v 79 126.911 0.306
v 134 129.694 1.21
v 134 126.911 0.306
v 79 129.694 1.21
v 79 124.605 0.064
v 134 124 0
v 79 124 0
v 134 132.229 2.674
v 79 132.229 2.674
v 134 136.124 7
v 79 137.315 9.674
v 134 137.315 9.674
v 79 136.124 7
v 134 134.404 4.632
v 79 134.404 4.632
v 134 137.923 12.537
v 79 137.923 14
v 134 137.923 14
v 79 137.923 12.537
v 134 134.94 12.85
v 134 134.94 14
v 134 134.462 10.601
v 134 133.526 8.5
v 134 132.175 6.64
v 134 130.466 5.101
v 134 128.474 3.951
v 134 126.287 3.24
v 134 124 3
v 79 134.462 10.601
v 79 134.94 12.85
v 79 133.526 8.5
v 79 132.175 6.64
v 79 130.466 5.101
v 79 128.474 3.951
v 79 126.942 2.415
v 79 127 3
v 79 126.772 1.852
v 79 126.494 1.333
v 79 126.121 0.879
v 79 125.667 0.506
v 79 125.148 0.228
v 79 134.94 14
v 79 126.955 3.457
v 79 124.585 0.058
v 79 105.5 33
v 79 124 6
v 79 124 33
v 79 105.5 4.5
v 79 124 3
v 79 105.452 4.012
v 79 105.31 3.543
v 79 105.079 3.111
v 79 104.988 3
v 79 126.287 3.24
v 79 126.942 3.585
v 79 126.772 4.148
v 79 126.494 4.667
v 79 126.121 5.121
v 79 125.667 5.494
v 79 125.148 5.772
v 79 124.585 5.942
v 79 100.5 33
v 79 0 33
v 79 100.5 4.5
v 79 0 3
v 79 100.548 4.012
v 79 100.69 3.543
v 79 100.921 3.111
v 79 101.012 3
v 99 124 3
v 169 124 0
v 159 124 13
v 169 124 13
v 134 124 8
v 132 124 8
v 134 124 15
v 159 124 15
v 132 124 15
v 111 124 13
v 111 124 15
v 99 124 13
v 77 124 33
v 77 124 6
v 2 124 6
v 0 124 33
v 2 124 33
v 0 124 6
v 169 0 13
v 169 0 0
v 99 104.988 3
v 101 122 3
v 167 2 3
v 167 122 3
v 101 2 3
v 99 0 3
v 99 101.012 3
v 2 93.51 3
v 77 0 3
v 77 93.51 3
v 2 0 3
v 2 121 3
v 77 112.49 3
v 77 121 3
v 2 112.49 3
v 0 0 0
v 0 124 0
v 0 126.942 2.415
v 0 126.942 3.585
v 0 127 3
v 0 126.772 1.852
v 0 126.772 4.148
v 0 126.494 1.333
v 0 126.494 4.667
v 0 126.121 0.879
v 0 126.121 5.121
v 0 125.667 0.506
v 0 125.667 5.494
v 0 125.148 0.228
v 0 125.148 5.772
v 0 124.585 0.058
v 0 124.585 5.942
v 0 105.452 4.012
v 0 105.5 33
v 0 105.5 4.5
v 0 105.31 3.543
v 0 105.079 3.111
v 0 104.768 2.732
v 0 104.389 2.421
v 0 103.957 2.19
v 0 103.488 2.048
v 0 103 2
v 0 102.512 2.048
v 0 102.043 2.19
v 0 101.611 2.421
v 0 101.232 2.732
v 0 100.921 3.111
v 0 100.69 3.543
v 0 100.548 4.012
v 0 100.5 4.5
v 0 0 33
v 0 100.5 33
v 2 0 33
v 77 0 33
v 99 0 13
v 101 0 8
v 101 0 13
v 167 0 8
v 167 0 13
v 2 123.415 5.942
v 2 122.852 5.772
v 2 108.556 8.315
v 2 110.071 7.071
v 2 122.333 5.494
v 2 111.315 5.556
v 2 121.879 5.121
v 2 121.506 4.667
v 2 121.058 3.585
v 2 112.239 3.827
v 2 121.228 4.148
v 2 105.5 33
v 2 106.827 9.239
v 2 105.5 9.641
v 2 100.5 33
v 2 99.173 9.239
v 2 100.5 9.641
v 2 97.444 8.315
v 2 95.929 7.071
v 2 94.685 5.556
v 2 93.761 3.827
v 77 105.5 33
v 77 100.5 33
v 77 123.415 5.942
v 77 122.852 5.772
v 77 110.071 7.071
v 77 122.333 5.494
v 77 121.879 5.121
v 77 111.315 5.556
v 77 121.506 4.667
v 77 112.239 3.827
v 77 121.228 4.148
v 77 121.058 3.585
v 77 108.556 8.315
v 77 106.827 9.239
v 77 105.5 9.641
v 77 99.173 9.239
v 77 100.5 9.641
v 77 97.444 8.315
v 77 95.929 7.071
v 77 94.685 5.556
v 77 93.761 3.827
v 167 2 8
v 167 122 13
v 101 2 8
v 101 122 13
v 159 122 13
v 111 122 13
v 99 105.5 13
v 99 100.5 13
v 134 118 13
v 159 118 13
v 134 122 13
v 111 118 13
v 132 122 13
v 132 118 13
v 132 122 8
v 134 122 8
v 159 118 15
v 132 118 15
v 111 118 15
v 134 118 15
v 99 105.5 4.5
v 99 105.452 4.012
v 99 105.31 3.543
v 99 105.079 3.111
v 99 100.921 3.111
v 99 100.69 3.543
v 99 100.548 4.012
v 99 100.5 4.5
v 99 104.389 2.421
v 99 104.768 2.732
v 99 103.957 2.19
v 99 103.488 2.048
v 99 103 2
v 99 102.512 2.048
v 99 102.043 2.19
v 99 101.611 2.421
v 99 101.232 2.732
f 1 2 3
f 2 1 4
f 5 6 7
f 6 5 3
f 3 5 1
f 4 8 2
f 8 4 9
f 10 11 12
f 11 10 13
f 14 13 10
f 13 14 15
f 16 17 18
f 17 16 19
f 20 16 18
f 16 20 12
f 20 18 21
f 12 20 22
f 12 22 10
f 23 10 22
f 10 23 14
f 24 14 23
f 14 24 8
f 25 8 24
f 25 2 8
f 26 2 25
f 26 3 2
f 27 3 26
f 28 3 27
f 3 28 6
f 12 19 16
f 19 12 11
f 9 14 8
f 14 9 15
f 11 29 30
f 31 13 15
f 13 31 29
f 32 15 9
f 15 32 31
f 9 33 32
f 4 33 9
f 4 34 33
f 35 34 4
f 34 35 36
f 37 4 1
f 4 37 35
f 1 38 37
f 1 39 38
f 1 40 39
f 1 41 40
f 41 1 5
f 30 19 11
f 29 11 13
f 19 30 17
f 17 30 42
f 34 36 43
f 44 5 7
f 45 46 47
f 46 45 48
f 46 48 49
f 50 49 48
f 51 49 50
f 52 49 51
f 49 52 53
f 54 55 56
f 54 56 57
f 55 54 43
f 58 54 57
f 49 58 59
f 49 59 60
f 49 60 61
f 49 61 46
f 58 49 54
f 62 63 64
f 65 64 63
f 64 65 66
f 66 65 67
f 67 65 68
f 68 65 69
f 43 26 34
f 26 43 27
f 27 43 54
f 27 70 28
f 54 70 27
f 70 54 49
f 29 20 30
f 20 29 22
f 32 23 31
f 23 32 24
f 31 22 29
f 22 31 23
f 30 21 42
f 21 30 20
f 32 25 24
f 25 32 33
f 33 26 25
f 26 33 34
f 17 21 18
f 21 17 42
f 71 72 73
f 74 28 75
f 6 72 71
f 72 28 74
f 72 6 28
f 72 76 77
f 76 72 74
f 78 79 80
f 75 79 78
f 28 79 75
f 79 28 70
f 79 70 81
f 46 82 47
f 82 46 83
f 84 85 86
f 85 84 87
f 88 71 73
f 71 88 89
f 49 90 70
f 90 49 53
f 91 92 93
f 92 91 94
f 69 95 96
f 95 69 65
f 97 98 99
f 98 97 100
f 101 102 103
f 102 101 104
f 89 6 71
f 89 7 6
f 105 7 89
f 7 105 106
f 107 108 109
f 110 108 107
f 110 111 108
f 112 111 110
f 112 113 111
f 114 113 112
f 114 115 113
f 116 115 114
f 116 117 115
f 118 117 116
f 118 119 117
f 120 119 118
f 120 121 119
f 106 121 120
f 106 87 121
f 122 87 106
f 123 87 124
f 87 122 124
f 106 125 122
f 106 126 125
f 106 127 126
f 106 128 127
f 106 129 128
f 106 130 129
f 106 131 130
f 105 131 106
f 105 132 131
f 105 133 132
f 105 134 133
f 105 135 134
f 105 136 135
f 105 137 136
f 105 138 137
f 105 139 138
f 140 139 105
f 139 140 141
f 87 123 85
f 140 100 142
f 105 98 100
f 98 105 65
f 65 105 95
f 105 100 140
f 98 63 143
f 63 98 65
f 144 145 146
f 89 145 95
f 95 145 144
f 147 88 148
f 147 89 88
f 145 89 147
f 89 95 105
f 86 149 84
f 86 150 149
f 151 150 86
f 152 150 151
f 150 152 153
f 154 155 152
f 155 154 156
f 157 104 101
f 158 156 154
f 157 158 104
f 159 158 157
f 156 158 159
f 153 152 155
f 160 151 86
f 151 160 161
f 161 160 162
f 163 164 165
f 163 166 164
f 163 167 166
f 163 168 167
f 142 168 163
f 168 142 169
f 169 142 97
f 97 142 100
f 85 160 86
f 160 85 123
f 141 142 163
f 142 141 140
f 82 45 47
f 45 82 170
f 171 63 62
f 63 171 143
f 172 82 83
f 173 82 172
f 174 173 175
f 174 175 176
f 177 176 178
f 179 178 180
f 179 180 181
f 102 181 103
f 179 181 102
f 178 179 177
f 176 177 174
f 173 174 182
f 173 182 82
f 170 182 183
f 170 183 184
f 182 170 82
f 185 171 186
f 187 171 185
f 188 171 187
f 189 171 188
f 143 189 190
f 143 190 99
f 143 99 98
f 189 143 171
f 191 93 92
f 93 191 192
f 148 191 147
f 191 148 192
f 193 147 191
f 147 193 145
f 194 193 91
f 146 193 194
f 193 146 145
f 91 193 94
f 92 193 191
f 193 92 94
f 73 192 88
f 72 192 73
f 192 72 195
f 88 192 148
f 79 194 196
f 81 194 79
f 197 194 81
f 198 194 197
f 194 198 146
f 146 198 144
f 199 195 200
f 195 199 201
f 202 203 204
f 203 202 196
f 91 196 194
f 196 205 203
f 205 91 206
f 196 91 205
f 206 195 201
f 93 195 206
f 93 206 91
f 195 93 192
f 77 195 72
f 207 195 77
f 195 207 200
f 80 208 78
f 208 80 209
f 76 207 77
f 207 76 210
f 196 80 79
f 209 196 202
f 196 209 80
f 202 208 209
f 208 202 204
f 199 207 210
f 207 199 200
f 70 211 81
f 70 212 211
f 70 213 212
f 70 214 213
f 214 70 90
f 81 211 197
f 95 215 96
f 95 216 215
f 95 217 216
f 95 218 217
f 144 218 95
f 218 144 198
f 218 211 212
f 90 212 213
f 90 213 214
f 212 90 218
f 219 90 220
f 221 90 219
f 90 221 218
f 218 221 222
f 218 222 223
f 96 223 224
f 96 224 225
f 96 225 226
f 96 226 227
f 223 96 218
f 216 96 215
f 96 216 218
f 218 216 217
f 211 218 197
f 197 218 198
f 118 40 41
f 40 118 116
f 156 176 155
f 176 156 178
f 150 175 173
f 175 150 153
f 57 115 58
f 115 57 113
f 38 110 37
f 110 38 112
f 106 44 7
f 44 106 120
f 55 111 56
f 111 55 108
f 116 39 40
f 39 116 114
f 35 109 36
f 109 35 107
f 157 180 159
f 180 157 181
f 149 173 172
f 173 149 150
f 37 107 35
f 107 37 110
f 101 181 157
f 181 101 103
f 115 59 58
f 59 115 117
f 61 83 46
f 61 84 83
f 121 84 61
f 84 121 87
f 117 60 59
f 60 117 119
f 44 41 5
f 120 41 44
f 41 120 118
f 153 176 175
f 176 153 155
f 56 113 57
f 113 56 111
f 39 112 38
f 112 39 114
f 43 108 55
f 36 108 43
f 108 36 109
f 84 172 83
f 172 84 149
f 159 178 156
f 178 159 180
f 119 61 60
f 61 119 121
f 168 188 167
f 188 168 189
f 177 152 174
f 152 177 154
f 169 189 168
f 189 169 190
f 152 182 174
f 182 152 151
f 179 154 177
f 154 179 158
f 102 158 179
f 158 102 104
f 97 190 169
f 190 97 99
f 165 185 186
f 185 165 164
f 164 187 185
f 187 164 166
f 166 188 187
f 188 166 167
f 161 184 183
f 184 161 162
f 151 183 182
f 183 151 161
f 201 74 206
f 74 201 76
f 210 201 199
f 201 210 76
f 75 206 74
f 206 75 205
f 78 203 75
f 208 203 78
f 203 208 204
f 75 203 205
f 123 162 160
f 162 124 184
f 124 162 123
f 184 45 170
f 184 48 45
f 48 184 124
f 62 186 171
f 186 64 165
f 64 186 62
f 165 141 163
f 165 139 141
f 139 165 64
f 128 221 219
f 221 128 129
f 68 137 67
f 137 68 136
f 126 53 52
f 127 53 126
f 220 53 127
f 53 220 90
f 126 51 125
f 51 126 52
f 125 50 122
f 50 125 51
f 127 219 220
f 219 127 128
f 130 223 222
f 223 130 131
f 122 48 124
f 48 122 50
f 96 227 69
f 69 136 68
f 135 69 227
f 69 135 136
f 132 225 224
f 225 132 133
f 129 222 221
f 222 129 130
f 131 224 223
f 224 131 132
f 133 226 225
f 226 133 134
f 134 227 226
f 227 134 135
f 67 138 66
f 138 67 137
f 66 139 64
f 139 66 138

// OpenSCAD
// Grundeinstellungen
wall = 2;                 // Wanddicke
base_thickness = 3;        // Stärke der Bodenplatte

// Tischfuß
tisch_breite = 70+5;         // Tischfuß-Breite
tisch_len = 120;           // geschätzt
tisch_high = 30;           // Wandhöhe für Führung

// Pedal
pedal_x_breite = 64+2;
pedal_y_len = 101+2;
pedal_high_front = 5;      // Wandhöhe vorne
pedal_high_back = 10;      // Wandhöhe hinten

pedal_roof_len = 4;          // 5.5mm Luft
pedal_roof_sidedistance = 10;

// USB
usb_breite = wall;
usb__high = 8;

d_cable_left = 5;

// Positionierung
abstand_zwischen = 20;
gesamt_x_breite = wall + tisch_breite + wall + abstand_zwischen + wall + pedal_x_breite + wall;
gesamt_y_laenge = max(tisch_len, pedal_y_len) + wall * 2;

module halterung() {
    difference() {
        union() {
            // Grundplatte
            cube([gesamt_x_breite, gesamt_y_laenge, base_thickness]);

            // Tischfuß linke Wand
            translate([0, 0, base_thickness])
                cube([wall, gesamt_y_laenge, tisch_high]);

            // Tischfuß rechte Wand
            translate([wall + tisch_breite, 0, base_thickness])
                cube([wall, gesamt_y_laenge, tisch_high]);

            ////// Koordinatenursprung für Pedalbereich ///////
            x_pedal = wall + tisch_breite + wall + abstand_zwischen + wall;

            // Pedal Vorne (unten bei Y)
            translate([x_pedal, 0, base_thickness])
                cube([pedal_x_breite, wall, pedal_high_front]);

            // Pedal Hinten (oben bei Y)
            translate([x_pedal, gesamt_y_laenge - wall, base_thickness])
                cube([pedal_x_breite, wall, pedal_high_back]);

            // Pedal roof/Halter hinten
            translate([x_pedal+pedal_roof_sidedistance, gesamt_y_laenge - wall - pedal_roof_len, base_thickness+pedal_high_back])
                cube([pedal_x_breite-pedal_roof_sidedistance*2 + wall, pedal_roof_len+wall, wall]);


            // Pedal links -x
            translate([x_pedal - wall, 0, base_thickness])
                cube([wall, gesamt_y_laenge, pedal_high_back]);

            // Pedal rechts +x
            translate([x_pedal + pedal_x_breite, 0, base_thickness])
                cube([wall, gesamt_y_laenge, pedal_high_back]);
                
            // Kabeldurchfuehrung rechts
            translate([wall + tisch_breite + wall, gesamt_y_laenge, 14])
                rotate([0,90,0])
                intersection(){
                    difference(){
                        cylinder(h=abstand_zwischen+wall+pedal_x_breite/2, r=14);
                        cylinder(h=abstand_zwischen+wall+pedal_x_breite/2, r=11);
                    }
                    cube([999,999,999]);
                    }
            // bumber hinten
        translate([0, gesamt_y_laenge, base_thickness])
                rotate([0,90,0])
                cylinder(h=wall+tisch_breite+wall, r=base_thickness, $fn=32);
//            }


            // Schutz für Kabeldurchführung
        translate([0, pedal_y_len, base_thickness*0])
                rotate([0,90,0])
                cylinder(h=wall+tisch_breite+wall, r=10, $fn=32);
//            }
                    
            
        }

        // USB-Ausschnitt in der hinteren Pedal-Wand
        translate([
            wall + tisch_breite + wall + abstand_zwischen + wall + pedal_x_breite/2 - wall,  // x-Position an hinterer Pedalwand
            gesamt_y_laenge - wall - pedal_roof_len,
            base_thickness + 5
        ])
                cube([wall, usb_breite + pedal_roof_len, usb__high]);

        
        //Auslass Kabel links
        translate([0, pedal_y_len-d_cable_left/2, base_thickness+d_cable_left/2-1])
            cube([wall+tisch_breite+wall+abstand_zwischen, d_cable_left, 123]);

        translate([0, pedal_y_len, base_thickness+d_cable_left/2-1])
                rotate([0,90,0])
                cylinder(h=wall+tisch_breite+wall+abstand_zwischen, d=d_cable_left, $fn=32);
//            }
                

        // alles unter Hauptplatte weg
        translate([0,0,-10])
            cube([999, 999, 10]);
            
    }
}

halterung();
